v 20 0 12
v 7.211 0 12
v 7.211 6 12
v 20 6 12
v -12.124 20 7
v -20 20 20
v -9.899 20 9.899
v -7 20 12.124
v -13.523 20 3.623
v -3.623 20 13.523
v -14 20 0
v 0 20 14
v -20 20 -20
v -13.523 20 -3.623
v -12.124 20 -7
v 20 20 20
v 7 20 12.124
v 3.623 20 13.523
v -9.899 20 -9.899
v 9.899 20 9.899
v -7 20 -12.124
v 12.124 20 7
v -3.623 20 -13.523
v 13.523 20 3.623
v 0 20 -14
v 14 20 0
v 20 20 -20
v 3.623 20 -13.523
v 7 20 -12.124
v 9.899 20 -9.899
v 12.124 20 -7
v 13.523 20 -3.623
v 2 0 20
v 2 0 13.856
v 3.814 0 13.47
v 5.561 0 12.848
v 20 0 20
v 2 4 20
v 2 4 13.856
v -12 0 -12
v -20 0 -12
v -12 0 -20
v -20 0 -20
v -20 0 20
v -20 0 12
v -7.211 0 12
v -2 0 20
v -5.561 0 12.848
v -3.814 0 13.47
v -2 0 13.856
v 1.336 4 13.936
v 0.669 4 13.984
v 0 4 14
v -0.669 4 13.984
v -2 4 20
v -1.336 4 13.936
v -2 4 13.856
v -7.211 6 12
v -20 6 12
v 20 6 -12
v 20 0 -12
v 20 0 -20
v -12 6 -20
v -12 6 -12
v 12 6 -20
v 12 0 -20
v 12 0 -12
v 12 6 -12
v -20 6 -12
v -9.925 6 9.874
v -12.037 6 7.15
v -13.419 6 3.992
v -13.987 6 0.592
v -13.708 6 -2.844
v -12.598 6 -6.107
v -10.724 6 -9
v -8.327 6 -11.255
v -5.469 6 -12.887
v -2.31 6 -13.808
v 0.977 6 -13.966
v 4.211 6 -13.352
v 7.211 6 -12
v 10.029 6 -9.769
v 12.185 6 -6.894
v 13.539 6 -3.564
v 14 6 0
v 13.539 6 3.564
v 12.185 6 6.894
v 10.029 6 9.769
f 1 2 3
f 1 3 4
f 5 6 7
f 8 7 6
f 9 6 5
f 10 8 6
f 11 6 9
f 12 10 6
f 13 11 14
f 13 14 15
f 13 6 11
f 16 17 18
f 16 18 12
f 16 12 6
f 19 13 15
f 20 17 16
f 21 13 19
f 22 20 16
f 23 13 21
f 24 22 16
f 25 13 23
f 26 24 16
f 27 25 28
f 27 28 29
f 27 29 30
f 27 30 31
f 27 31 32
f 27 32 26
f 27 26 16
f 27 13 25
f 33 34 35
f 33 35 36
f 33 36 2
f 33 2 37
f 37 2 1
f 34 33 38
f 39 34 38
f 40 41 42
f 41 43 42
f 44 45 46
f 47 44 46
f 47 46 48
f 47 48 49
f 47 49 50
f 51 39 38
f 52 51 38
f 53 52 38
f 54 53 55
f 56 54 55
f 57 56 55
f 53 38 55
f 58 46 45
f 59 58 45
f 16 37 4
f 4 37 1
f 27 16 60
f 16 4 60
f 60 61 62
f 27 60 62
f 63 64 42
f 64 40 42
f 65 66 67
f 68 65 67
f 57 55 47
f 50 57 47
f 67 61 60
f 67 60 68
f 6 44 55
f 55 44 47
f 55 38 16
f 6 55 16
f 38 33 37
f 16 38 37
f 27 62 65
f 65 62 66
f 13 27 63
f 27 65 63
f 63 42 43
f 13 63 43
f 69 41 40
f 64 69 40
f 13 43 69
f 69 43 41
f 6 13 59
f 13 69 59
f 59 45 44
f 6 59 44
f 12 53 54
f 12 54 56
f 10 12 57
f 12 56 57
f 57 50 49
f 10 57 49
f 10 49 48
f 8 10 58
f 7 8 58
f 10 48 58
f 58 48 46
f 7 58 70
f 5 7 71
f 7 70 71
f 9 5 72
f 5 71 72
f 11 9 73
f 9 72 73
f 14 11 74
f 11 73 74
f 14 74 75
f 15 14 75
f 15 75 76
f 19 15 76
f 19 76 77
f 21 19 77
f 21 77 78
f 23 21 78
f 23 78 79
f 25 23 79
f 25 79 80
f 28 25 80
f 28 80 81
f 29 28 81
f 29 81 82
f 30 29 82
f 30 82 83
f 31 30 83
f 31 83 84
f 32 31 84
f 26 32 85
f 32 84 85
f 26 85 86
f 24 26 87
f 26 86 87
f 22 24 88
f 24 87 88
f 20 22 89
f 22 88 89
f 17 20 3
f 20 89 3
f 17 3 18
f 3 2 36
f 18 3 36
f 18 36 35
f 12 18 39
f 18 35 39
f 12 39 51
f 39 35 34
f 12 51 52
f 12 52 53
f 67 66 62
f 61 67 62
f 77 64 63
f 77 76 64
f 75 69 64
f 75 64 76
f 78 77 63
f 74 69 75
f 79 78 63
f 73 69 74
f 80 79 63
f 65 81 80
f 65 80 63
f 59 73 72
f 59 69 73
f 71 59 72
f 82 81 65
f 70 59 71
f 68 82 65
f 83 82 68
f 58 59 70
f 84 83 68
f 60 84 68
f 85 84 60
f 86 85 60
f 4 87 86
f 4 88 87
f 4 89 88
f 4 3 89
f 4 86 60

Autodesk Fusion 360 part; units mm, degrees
sketch "Sketch1" plane through (0, 0, 0) normal (0, 1, 0) x (1, 0, 0)
  line L0 (20, 20) -> (-20, 20)
  line L1 (-20, 20) -> (-20, -20)
  line L2 (-20, -20) -> (20, -20)
  line L3 (20, -20) -> (20, 20)
  line L4 (20, 20) -> (-20, -20) construction
  line L5 (-20, 20) -> (20, -20) construction
  dimension "d1" = 40
extrude "Extrude1" add sketch "Sketch1" along normal blind 20
sketch "Sketch2" plane through (0, 20, 0) normal (0, 1, 0) x (-1, 0, 0)
  line L0 (-20, 20) -> (-20, -20)
  line L1 (-20, -20) -> (20, -20)
  line L2 (20, -20) -> (20, 20)
  line L3 (20, 20) -> (-20, 20)
hole "Hole1" at (0, 20, 0) direction (0, -1, 0) diameter 28 end through all
sketch "Sketch3" plane through (0, 0, 20) normal (0, 0, 1) x (1, 0, 0)
  line L0 (-20, 0) -> (20, 0)
  line L1 (20, 0) -> (20, 20)
  line L2 (20, 20) -> (-20, 20)
  line L3 (-20, 20) -> (-20, 0)
  line L4 (2, 4) -> (-2, 4)
  line L5 (-2, 4) -> (-2, -4)
  line L6 (-2, -4) -> (2, -4)
  line L7 (2, -4) -> (2, 4)
  line L8 (2, 4) -> (-2, -4) construction
  line L9 (-2, 4) -> (2, -4) construction
  dimension "d7" = 4
  dimension "d8" = 8
extrude "Extrude2" cut sketch "Sketch3" against normal blind 10 contours L0 L4 L5 L7
sketch "Sketch4" plane through (0, 0, 0) normal (0, -1, 0) x (1, 0, 0)
  line L0 (-2, 13.8564) -> (-2, 20)
  line L1 (-2, 20) -> (-20, 20)
  line L2 (-20, 20) -> (-20, -20)
  line L3 (-20, -20) -> (20, -20)
  line L4 (20, -20) -> (20, 20)
  line L5 (20, 20) -> (2, 20)
  line L6 (2, 20) -> (2, 13.8564)
  arc A0 (-2, 13.8564) -> (2, 13.8564) centre (0, 0) ccw
  line L7 (25, -12) -> (5, -12)
  line L8 (5, -12) -> (5, 12)
  line L9 (5, 12) -> (25, 12)
  line L10 (25, 12) -> (25, -12)
  line L11 (25, -12) -> (5, 12) construction
  line L12 (5, -12) -> (25, 12) construction
  point P0 (15, 0)
extrude "Extrude3" cut sketch "Sketch4" against normal blind 6 contours L4 A0 L7 L9
sketch "Sketch5" plane through (0, 0, 0) normal (0, -1, 0) x (1, 0, 0)
  line L0 (20, -12) -> (7.2111, -12)
  arc A0 (-2, 13.8564) -> (7.2111, -12) centre (0, 0) ccw
  line L1 (-2, 13.8564) -> (-2, 20)
  line L2 (-2, 20) -> (-20, 20)
  line L3 (-20, 20) -> (-20, -20)
  line L4 (-20, -20) -> (20, -20)
  line L5 (20, -20) -> (20, -12)
  line L6 (12, -9) -> (-12, -9)
  line L7 (-12, -9) -> (-12, -31)
  line L8 (-12, -31) -> (12, -31)
  line L9 (12, -31) -> (12, -9)
  line L10 (12, -9) -> (-12, -31) construction
  line L11 (-12, -9) -> (12, -31) construction
  point P0 (0, -20)
extrude "Extrude4" cut sketch "Sketch5" against normal blind 6 contours L0 A0 L4 L6 L7 L9
sketch "Sketch6" plane through (0, 0, 0) normal (0, -1, 0) x (1, 0, 0)
  line L0 (-12, -20) -> (-12, -9)
  line L1 (-12, -9) -> (-10.7238, -9)
  arc A0 (-2, 13.8564) -> (-10.7238, -9) centre (0, 0) ccw
  line L2 (-2, 13.8564) -> (-2, 20)
  line L3 (-2, 20) -> (-20, 20)
  line L4 (-20, 20) -> (-20, -20)
  line L5 (-20, -20) -> (-12, -20)
  line L6 (-4, 12) -> (-36, 12)
  line L7 (-36, 12) -> (-36, -12)
  line L8 (-36, -12) -> (-4, -12)
  line L9 (-4, -12) -> (-4, 12)
  line L10 (-4, 12) -> (-36, -12) construction
  line L11 (-36, 12) -> (-4, -12) construction
  point P0 (-20, 0)
extrude "Extrude5" cut sketch "Sketch6" against normal blind 6 contours L0 L1 A0 L4 L6 L8
